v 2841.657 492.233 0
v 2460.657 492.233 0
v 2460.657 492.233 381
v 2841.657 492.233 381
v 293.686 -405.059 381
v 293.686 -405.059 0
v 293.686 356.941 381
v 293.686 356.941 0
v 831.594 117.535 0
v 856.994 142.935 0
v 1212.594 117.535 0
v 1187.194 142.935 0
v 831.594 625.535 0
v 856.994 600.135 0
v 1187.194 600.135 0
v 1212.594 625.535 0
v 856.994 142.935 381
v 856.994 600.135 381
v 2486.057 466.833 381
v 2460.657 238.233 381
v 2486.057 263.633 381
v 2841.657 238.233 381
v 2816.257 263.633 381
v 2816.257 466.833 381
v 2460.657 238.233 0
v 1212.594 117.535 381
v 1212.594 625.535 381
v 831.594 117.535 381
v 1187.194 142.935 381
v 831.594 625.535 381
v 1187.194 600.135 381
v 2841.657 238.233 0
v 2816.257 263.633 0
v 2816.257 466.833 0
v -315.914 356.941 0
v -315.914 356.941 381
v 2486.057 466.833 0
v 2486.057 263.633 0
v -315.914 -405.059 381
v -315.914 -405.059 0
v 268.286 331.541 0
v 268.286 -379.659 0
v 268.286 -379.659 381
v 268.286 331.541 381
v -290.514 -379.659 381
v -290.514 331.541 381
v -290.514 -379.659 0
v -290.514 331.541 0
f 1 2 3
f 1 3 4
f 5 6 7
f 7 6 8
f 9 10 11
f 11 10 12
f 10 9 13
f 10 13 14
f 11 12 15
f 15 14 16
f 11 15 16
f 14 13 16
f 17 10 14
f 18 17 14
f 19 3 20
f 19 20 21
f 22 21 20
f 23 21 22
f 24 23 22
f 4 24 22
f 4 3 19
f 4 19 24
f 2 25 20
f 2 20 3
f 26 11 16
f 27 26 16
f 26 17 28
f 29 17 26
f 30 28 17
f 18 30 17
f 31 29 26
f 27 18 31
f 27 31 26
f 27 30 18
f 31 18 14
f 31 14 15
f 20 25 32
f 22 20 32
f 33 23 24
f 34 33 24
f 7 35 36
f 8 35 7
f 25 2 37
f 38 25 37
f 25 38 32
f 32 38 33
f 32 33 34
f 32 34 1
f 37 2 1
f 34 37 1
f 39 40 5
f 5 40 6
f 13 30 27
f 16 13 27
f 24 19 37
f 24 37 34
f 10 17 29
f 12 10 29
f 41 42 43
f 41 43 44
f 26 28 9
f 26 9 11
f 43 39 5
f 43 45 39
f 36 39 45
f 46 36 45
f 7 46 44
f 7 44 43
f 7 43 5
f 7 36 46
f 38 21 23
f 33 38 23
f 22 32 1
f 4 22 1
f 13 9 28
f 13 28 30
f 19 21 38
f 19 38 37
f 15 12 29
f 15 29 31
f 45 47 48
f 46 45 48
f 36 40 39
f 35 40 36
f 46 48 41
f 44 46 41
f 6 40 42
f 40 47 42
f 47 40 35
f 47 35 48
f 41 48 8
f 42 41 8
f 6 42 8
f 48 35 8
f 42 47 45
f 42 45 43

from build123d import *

# Parameters (mm, degrees)
F0_W     = 609.6
F0_H     = 762
F0_W_2   = 558.8
F0_H_2   = 711.2
F1_DEPTH = 381
F2_W     = 381
F2_H     = 508
F2_W_2   = 330.2
F2_H_2   = 457.2
F3_DEPTH = 381
F4_W     = 381
F4_H     = 254
F4_W_2   = 330.2
F4_H_2   = 203.2
F5_DEPTH = 381


with BuildPart() as f1:
    # F0 (on Top) → F1 (new body)
    with BuildSketch(Plane.XY):
        with Locations((-11.113675, -24.059143)):
            Rectangle(F0_W, F0_H)
        with Locations((-11.113675, -24.059143)):
            Rectangle(F0_W_2, F0_H_2, mode=Mode.SUBTRACT)
    extrude(amount=F1_DEPTH)


with BuildPart() as f3:
    # F2 (on Top) → F3 (new body)
    with BuildSketch(Plane.XY):
        with Locations((1022.093705, 371.535344)):
            Rectangle(F2_W, F2_H)
        with Locations((1022.093705, 371.535344)):
            Rectangle(F2_W_2, F2_H_2, mode=Mode.SUBTRACT)
    extrude(amount=F3_DEPTH)


with BuildPart() as f5:
    # F4 (on Top) → F5 (new body)
    with BuildSketch(Plane.XY):
        with Locations((2651.157399, 365.232877)):
            Rectangle(F4_W, F4_H)
        with Locations((2651.157399, 365.232877)):
            Rectangle(F4_W_2, F4_H_2, mode=Mode.SUBTRACT)
    extrude(amount=F5_DEPTH)


solid = Compound([f1.part, f3.part, f5.part])
